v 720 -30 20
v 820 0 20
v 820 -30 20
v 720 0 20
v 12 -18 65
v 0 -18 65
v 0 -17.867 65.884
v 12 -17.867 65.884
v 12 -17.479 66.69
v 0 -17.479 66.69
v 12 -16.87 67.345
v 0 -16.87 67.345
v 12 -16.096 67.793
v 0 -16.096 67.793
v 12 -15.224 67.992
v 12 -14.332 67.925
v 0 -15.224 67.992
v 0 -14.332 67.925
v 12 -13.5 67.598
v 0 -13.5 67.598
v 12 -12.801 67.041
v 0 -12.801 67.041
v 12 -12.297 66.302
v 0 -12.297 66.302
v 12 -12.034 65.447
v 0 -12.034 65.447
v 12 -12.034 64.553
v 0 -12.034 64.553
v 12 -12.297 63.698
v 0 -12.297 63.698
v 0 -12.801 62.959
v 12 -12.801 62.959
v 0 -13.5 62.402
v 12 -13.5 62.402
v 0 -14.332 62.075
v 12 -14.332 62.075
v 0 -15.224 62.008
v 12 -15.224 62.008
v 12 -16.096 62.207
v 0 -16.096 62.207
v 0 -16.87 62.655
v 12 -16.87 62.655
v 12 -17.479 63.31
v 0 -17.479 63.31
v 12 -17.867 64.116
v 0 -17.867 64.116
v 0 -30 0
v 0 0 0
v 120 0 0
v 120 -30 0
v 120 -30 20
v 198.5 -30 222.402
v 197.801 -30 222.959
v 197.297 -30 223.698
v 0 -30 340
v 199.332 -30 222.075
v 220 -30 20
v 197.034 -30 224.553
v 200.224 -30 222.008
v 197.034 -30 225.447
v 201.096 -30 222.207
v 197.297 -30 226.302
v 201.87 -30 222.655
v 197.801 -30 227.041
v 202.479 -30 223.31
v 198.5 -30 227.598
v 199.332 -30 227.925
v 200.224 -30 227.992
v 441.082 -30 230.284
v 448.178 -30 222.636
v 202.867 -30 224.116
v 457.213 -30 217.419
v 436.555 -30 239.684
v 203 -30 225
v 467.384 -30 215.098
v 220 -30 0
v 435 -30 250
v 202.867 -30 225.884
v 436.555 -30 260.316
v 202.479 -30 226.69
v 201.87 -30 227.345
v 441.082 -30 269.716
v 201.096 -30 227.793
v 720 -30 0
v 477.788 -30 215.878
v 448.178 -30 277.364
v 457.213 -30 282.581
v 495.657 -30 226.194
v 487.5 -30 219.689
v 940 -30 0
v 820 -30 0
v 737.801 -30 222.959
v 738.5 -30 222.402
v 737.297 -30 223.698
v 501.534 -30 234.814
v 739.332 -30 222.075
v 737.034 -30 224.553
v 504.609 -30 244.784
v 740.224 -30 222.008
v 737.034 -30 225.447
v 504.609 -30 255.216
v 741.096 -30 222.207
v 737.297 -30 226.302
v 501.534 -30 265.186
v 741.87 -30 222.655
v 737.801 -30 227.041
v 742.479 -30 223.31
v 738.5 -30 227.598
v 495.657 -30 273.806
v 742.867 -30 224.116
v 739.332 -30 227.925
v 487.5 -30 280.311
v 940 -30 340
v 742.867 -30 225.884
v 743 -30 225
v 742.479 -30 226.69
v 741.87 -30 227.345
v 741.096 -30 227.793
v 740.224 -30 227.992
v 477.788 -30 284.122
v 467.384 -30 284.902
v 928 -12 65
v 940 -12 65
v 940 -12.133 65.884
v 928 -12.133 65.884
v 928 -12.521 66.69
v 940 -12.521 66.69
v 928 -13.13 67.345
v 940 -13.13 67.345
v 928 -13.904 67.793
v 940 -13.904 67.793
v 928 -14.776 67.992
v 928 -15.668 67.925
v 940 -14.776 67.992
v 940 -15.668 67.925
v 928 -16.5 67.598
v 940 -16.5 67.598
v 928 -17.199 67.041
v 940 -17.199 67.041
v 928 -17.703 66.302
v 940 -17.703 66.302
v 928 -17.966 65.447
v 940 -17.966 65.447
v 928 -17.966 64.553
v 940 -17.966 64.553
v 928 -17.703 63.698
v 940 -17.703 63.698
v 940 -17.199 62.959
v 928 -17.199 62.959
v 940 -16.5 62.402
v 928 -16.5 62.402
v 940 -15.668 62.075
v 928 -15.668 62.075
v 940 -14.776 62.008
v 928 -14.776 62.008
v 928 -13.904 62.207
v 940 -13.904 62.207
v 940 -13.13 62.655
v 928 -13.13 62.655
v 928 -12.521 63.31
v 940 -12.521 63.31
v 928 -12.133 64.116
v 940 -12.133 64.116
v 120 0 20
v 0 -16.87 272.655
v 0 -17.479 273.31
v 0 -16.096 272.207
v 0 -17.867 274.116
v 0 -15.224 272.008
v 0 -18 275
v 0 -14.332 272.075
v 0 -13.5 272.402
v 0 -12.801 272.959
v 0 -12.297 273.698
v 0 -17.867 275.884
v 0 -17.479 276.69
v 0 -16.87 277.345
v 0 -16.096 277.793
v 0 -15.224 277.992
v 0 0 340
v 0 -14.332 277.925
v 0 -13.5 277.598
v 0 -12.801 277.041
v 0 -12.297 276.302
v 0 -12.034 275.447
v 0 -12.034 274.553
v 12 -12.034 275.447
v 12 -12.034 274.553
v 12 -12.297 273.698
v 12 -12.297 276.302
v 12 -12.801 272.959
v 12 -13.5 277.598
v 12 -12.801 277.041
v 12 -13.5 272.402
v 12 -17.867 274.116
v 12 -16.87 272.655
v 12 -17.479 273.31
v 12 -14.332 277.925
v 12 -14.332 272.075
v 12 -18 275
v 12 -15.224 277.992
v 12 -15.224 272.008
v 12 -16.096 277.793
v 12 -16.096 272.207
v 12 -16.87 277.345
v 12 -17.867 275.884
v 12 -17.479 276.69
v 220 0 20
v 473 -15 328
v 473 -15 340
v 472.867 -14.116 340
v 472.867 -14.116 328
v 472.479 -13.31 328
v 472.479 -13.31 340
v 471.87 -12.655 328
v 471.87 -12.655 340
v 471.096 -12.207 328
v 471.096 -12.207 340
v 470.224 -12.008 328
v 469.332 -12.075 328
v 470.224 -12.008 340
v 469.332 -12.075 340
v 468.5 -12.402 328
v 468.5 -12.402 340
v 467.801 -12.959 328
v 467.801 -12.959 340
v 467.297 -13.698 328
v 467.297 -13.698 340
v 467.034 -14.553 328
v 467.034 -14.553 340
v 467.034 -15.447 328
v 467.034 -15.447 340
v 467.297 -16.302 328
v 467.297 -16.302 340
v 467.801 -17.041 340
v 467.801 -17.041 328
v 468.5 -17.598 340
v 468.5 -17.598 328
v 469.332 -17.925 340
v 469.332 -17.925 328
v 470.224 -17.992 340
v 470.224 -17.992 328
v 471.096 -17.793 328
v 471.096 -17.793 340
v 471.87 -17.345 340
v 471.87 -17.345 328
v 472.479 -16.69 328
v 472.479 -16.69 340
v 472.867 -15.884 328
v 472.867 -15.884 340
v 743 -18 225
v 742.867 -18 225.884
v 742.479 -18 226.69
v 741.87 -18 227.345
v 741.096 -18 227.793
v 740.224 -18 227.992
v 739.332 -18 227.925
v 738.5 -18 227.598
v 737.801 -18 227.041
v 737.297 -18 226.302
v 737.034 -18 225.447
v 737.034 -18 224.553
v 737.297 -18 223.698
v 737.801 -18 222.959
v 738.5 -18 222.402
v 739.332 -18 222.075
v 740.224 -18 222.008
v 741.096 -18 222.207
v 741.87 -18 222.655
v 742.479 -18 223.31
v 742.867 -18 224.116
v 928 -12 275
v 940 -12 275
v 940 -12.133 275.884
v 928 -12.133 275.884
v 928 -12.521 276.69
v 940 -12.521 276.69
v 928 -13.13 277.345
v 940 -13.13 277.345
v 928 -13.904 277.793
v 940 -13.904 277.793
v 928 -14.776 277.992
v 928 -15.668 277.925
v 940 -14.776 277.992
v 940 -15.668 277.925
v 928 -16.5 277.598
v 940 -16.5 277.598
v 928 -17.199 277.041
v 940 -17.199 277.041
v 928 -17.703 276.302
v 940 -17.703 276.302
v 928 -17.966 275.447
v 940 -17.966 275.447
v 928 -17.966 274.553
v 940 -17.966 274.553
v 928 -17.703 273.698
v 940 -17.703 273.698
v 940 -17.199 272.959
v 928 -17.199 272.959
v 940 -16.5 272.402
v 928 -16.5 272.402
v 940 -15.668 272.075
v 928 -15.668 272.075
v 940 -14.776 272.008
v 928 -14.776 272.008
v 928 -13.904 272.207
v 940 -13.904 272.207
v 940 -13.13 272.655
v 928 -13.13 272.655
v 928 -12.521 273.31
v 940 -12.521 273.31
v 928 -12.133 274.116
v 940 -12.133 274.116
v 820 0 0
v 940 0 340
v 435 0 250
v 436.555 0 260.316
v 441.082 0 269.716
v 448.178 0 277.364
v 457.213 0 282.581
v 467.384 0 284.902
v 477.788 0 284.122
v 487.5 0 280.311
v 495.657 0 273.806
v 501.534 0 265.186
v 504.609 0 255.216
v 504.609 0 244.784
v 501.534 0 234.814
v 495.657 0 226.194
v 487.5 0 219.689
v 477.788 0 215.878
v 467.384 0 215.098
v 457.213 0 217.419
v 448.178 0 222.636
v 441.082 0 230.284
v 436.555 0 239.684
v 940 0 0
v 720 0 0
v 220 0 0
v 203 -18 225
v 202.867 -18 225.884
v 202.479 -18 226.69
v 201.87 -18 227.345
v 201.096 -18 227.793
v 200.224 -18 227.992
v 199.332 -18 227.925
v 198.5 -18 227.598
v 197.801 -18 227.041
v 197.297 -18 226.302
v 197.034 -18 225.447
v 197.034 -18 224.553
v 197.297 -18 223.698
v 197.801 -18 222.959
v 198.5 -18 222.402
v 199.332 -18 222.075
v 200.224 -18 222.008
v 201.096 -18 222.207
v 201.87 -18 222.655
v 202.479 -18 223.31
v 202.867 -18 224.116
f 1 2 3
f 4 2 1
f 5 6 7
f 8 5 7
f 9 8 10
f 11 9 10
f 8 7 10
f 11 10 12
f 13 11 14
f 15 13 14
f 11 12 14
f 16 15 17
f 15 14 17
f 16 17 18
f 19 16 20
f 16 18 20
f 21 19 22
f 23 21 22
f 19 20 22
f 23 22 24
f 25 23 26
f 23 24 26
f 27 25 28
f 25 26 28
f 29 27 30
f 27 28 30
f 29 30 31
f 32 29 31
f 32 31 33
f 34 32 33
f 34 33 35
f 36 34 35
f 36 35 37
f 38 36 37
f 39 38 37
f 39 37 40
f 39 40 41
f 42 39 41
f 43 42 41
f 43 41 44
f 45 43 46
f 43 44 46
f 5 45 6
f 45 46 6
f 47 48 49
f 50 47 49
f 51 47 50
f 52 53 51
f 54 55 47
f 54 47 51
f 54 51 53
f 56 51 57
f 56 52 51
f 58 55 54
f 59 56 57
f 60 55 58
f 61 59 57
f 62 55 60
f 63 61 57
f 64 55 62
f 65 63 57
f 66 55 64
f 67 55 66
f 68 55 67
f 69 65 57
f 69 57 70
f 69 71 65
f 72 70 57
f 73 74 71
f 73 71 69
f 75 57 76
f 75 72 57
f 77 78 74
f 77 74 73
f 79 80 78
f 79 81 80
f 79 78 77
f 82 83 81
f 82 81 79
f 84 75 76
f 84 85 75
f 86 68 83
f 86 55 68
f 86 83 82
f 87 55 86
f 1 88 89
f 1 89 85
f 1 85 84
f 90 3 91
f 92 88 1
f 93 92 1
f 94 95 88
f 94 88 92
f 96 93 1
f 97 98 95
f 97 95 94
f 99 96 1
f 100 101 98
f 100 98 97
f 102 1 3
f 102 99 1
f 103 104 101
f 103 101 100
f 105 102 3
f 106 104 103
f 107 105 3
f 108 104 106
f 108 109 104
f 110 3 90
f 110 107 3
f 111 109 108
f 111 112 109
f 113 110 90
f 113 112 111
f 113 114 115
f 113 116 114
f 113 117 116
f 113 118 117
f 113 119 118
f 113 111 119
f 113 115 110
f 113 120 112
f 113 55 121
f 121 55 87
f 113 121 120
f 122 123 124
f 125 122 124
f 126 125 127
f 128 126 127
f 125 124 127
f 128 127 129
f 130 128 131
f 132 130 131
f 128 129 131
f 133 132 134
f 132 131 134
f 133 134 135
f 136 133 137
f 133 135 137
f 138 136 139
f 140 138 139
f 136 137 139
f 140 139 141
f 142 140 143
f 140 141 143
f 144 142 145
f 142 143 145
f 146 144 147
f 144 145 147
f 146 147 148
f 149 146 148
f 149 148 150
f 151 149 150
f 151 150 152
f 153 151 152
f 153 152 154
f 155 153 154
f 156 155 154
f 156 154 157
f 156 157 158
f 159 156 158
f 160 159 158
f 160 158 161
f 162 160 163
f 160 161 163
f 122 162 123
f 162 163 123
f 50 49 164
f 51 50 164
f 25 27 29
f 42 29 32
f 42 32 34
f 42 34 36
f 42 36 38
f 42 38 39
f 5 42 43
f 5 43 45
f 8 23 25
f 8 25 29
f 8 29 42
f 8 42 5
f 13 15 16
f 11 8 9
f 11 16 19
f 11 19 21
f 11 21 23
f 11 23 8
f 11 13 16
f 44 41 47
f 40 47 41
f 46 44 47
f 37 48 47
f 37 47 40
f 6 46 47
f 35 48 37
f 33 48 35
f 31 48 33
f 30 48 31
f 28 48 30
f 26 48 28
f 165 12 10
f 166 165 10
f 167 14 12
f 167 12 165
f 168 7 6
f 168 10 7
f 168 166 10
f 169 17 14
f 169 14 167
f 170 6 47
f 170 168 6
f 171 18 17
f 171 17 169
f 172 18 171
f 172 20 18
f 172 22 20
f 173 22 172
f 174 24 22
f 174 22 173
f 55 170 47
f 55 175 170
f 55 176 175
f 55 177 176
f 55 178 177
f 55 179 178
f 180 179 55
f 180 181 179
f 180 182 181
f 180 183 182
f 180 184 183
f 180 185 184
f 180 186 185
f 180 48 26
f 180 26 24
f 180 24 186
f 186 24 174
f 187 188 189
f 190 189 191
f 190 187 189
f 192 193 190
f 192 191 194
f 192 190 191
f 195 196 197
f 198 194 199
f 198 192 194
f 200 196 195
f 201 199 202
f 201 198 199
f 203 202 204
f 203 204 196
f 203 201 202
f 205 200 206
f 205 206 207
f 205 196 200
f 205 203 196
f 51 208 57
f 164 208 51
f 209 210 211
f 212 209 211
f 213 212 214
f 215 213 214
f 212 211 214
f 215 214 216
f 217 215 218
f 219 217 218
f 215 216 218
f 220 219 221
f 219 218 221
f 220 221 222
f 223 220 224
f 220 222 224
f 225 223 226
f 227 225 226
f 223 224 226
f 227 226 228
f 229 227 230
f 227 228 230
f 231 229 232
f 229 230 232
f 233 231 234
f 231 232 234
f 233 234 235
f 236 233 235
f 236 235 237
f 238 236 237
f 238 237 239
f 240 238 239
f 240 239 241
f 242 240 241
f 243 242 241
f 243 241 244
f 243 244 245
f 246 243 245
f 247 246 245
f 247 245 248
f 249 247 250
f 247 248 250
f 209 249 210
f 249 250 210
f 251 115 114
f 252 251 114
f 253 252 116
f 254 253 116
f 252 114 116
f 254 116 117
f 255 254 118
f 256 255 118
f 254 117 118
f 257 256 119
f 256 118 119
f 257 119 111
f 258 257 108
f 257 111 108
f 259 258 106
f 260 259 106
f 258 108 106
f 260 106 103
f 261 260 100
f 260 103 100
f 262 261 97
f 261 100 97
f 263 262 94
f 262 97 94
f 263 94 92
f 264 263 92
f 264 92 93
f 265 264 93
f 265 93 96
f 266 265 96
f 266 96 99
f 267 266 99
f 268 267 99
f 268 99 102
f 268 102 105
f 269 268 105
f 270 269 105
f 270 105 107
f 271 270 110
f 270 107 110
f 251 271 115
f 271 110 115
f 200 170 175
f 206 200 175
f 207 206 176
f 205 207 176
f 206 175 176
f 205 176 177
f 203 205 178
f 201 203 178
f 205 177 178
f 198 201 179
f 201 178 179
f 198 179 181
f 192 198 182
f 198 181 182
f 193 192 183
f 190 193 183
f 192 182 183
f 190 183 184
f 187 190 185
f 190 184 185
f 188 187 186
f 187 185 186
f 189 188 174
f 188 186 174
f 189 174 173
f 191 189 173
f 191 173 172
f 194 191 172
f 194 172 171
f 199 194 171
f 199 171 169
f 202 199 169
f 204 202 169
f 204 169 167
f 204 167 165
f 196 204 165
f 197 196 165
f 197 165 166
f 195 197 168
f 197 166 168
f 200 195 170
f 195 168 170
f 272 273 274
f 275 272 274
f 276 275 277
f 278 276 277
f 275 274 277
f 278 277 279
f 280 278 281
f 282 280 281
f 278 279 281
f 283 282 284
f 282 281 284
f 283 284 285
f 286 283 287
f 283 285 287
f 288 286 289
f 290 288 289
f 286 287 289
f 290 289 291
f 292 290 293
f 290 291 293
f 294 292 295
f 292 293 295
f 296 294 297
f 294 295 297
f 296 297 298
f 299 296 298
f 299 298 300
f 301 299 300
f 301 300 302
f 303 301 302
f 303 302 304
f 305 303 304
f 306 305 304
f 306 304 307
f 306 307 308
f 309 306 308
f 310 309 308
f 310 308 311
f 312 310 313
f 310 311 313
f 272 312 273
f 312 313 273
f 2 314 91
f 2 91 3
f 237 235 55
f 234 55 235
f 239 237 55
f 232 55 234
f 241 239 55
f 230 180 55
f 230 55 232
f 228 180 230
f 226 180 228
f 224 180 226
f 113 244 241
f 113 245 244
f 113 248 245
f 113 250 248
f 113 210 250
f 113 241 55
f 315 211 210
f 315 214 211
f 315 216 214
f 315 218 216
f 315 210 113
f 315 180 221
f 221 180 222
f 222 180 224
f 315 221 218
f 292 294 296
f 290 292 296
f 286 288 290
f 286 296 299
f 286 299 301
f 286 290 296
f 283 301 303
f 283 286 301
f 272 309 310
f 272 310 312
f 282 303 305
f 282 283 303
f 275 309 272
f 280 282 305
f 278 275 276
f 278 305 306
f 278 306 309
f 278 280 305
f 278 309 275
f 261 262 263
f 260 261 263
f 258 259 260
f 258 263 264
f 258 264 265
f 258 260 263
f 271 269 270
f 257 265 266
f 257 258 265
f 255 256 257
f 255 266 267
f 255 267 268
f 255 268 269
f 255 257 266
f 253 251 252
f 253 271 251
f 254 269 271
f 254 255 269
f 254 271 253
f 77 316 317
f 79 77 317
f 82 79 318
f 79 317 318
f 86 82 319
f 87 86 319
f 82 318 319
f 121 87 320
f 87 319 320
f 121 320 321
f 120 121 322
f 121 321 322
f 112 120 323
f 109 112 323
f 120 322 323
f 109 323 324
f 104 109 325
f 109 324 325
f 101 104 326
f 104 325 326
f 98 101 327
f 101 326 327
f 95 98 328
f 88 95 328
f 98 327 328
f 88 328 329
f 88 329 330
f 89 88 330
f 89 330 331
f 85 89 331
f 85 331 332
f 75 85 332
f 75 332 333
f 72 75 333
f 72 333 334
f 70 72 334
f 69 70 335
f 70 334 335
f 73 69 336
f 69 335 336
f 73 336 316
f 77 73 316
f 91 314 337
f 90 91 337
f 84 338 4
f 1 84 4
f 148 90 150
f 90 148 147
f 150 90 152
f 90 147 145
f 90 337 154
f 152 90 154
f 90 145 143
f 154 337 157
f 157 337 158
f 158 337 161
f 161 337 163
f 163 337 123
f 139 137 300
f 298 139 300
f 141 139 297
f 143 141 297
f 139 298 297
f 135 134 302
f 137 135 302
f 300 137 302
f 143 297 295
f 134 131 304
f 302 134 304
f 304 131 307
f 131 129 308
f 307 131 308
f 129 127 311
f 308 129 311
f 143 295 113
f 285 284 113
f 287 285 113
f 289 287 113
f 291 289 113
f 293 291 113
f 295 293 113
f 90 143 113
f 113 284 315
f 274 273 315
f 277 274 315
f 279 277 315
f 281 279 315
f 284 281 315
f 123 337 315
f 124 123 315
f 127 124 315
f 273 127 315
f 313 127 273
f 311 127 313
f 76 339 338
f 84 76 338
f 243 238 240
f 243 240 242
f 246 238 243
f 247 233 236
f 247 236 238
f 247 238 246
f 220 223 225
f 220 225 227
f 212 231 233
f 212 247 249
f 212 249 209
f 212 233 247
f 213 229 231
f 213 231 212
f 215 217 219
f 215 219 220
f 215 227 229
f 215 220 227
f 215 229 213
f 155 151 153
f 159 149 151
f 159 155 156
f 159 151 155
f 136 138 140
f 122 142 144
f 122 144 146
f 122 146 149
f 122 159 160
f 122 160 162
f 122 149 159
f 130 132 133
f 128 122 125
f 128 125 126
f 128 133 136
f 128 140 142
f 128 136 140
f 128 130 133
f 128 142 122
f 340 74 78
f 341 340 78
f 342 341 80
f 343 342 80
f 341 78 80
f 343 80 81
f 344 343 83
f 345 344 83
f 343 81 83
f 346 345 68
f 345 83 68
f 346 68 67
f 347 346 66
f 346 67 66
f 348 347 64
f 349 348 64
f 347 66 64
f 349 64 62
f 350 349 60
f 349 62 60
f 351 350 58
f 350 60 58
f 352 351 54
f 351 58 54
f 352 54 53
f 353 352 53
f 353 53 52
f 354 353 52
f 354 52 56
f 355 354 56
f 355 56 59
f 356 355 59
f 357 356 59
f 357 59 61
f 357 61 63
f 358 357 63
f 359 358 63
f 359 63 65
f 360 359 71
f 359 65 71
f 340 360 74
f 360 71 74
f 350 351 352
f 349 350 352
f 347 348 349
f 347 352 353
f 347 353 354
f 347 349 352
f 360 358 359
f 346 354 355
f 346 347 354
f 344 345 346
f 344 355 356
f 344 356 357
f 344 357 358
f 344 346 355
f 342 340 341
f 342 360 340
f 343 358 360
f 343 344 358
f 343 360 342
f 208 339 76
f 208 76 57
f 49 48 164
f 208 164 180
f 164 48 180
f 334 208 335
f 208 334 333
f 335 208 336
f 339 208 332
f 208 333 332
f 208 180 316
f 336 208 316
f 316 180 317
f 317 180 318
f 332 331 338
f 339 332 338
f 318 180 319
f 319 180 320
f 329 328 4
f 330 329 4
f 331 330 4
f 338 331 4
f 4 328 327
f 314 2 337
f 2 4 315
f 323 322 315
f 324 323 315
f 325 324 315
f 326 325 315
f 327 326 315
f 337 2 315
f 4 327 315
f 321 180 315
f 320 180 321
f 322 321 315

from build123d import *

# Parameters (mm, degrees)
F0_W      = 940
F0_H      = 340
F1_DEPTH  = 30
F2_R      = 3
F3_DEPTH  = 12
F4_W      = 100
F4_H      = 20
F5_DEPTH  = 30
F6_W      = 100
F6_H      = 20
F7_DEPTH  = 30
F8_R      = 35
F9_DEPTH  = 30
F11_R     = 3
F12_DEPTH = 12
F13_R     = 3
F14_DEPTH = 12
F15_R     = 3
F16_DEPTH = 12


with BuildPart() as f1:
    # F0 (on Front) → F1 (new body)
    with BuildSketch(Plane.XZ):
        with Locations((470, 170)):
            Rectangle(F0_W, F0_H)
    extrude(amount=F1_DEPTH)

    # F2 (on face) → F3 (cut)
    with BuildSketch(Plane.XY.offset(340)):
        with Locations((470, -15)):
            Circle(F2_R)
    extrude(amount=-F3_DEPTH, mode=Mode.SUBTRACT)

    # F4 (on face) → F5 (cut)
    with BuildSketch(Plane(origin=(0, 0, 0), x_dir=(-1, 0, 0), z_dir=(0, 1, 0))):
        with Locations((-770, 10)):
            Rectangle(F4_W, F4_H)
    extrude(amount=-F5_DEPTH, mode=Mode.SUBTRACT)

    # F6 (on face) → F7 (cut)
    with BuildSketch(Plane(origin=(0, 0, 0), x_dir=(-1, 0, 0), z_dir=(0, 1, 0))):
        with Locations((-170, 10)):
            Rectangle(F6_W, F6_H)
    extrude(amount=-F7_DEPTH, mode=Mode.SUBTRACT)

    # F8 (on face) → F9 (cut)
    with BuildSketch(Plane(origin=(0, 0, 0), x_dir=(-1, 0, 0), z_dir=(0, 1, 0))):
        with Locations((-470, 250)):
            Circle(F8_R)
    extrude(amount=-F9_DEPTH, mode=Mode.SUBTRACT)

    # F11 (on face) → F12 (cut)
    with BuildSketch(Plane.YZ.offset(940)):
        with Locations((-15, 275)):
            Circle(F11_R)
        with Locations((-15, 65)):
            Circle(F11_R)
    extrude(amount=-F12_DEPTH, mode=Mode.SUBTRACT)

    # F13 (on face) → F14 (cut)
    with BuildSketch(Plane(origin=(0, 0, 0), x_dir=(0, -1, 0), z_dir=(-1, 0, 0))):
        with Locations((15, 275)):
            Circle(F13_R)
        with Locations((15, 65)):
            Circle(F13_R)
    extrude(amount=-F14_DEPTH, mode=Mode.SUBTRACT)

    # F15 (on face) → F16 (cut)
    with BuildSketch(Plane.XZ.offset(30)):
        with Locations((740, 225)):
            Circle(F15_R)
        with Locations((200, 225)):
            Circle(F15_R)
    extrude(amount=-F16_DEPTH, mode=Mode.SUBTRACT)


solid = f1.part
